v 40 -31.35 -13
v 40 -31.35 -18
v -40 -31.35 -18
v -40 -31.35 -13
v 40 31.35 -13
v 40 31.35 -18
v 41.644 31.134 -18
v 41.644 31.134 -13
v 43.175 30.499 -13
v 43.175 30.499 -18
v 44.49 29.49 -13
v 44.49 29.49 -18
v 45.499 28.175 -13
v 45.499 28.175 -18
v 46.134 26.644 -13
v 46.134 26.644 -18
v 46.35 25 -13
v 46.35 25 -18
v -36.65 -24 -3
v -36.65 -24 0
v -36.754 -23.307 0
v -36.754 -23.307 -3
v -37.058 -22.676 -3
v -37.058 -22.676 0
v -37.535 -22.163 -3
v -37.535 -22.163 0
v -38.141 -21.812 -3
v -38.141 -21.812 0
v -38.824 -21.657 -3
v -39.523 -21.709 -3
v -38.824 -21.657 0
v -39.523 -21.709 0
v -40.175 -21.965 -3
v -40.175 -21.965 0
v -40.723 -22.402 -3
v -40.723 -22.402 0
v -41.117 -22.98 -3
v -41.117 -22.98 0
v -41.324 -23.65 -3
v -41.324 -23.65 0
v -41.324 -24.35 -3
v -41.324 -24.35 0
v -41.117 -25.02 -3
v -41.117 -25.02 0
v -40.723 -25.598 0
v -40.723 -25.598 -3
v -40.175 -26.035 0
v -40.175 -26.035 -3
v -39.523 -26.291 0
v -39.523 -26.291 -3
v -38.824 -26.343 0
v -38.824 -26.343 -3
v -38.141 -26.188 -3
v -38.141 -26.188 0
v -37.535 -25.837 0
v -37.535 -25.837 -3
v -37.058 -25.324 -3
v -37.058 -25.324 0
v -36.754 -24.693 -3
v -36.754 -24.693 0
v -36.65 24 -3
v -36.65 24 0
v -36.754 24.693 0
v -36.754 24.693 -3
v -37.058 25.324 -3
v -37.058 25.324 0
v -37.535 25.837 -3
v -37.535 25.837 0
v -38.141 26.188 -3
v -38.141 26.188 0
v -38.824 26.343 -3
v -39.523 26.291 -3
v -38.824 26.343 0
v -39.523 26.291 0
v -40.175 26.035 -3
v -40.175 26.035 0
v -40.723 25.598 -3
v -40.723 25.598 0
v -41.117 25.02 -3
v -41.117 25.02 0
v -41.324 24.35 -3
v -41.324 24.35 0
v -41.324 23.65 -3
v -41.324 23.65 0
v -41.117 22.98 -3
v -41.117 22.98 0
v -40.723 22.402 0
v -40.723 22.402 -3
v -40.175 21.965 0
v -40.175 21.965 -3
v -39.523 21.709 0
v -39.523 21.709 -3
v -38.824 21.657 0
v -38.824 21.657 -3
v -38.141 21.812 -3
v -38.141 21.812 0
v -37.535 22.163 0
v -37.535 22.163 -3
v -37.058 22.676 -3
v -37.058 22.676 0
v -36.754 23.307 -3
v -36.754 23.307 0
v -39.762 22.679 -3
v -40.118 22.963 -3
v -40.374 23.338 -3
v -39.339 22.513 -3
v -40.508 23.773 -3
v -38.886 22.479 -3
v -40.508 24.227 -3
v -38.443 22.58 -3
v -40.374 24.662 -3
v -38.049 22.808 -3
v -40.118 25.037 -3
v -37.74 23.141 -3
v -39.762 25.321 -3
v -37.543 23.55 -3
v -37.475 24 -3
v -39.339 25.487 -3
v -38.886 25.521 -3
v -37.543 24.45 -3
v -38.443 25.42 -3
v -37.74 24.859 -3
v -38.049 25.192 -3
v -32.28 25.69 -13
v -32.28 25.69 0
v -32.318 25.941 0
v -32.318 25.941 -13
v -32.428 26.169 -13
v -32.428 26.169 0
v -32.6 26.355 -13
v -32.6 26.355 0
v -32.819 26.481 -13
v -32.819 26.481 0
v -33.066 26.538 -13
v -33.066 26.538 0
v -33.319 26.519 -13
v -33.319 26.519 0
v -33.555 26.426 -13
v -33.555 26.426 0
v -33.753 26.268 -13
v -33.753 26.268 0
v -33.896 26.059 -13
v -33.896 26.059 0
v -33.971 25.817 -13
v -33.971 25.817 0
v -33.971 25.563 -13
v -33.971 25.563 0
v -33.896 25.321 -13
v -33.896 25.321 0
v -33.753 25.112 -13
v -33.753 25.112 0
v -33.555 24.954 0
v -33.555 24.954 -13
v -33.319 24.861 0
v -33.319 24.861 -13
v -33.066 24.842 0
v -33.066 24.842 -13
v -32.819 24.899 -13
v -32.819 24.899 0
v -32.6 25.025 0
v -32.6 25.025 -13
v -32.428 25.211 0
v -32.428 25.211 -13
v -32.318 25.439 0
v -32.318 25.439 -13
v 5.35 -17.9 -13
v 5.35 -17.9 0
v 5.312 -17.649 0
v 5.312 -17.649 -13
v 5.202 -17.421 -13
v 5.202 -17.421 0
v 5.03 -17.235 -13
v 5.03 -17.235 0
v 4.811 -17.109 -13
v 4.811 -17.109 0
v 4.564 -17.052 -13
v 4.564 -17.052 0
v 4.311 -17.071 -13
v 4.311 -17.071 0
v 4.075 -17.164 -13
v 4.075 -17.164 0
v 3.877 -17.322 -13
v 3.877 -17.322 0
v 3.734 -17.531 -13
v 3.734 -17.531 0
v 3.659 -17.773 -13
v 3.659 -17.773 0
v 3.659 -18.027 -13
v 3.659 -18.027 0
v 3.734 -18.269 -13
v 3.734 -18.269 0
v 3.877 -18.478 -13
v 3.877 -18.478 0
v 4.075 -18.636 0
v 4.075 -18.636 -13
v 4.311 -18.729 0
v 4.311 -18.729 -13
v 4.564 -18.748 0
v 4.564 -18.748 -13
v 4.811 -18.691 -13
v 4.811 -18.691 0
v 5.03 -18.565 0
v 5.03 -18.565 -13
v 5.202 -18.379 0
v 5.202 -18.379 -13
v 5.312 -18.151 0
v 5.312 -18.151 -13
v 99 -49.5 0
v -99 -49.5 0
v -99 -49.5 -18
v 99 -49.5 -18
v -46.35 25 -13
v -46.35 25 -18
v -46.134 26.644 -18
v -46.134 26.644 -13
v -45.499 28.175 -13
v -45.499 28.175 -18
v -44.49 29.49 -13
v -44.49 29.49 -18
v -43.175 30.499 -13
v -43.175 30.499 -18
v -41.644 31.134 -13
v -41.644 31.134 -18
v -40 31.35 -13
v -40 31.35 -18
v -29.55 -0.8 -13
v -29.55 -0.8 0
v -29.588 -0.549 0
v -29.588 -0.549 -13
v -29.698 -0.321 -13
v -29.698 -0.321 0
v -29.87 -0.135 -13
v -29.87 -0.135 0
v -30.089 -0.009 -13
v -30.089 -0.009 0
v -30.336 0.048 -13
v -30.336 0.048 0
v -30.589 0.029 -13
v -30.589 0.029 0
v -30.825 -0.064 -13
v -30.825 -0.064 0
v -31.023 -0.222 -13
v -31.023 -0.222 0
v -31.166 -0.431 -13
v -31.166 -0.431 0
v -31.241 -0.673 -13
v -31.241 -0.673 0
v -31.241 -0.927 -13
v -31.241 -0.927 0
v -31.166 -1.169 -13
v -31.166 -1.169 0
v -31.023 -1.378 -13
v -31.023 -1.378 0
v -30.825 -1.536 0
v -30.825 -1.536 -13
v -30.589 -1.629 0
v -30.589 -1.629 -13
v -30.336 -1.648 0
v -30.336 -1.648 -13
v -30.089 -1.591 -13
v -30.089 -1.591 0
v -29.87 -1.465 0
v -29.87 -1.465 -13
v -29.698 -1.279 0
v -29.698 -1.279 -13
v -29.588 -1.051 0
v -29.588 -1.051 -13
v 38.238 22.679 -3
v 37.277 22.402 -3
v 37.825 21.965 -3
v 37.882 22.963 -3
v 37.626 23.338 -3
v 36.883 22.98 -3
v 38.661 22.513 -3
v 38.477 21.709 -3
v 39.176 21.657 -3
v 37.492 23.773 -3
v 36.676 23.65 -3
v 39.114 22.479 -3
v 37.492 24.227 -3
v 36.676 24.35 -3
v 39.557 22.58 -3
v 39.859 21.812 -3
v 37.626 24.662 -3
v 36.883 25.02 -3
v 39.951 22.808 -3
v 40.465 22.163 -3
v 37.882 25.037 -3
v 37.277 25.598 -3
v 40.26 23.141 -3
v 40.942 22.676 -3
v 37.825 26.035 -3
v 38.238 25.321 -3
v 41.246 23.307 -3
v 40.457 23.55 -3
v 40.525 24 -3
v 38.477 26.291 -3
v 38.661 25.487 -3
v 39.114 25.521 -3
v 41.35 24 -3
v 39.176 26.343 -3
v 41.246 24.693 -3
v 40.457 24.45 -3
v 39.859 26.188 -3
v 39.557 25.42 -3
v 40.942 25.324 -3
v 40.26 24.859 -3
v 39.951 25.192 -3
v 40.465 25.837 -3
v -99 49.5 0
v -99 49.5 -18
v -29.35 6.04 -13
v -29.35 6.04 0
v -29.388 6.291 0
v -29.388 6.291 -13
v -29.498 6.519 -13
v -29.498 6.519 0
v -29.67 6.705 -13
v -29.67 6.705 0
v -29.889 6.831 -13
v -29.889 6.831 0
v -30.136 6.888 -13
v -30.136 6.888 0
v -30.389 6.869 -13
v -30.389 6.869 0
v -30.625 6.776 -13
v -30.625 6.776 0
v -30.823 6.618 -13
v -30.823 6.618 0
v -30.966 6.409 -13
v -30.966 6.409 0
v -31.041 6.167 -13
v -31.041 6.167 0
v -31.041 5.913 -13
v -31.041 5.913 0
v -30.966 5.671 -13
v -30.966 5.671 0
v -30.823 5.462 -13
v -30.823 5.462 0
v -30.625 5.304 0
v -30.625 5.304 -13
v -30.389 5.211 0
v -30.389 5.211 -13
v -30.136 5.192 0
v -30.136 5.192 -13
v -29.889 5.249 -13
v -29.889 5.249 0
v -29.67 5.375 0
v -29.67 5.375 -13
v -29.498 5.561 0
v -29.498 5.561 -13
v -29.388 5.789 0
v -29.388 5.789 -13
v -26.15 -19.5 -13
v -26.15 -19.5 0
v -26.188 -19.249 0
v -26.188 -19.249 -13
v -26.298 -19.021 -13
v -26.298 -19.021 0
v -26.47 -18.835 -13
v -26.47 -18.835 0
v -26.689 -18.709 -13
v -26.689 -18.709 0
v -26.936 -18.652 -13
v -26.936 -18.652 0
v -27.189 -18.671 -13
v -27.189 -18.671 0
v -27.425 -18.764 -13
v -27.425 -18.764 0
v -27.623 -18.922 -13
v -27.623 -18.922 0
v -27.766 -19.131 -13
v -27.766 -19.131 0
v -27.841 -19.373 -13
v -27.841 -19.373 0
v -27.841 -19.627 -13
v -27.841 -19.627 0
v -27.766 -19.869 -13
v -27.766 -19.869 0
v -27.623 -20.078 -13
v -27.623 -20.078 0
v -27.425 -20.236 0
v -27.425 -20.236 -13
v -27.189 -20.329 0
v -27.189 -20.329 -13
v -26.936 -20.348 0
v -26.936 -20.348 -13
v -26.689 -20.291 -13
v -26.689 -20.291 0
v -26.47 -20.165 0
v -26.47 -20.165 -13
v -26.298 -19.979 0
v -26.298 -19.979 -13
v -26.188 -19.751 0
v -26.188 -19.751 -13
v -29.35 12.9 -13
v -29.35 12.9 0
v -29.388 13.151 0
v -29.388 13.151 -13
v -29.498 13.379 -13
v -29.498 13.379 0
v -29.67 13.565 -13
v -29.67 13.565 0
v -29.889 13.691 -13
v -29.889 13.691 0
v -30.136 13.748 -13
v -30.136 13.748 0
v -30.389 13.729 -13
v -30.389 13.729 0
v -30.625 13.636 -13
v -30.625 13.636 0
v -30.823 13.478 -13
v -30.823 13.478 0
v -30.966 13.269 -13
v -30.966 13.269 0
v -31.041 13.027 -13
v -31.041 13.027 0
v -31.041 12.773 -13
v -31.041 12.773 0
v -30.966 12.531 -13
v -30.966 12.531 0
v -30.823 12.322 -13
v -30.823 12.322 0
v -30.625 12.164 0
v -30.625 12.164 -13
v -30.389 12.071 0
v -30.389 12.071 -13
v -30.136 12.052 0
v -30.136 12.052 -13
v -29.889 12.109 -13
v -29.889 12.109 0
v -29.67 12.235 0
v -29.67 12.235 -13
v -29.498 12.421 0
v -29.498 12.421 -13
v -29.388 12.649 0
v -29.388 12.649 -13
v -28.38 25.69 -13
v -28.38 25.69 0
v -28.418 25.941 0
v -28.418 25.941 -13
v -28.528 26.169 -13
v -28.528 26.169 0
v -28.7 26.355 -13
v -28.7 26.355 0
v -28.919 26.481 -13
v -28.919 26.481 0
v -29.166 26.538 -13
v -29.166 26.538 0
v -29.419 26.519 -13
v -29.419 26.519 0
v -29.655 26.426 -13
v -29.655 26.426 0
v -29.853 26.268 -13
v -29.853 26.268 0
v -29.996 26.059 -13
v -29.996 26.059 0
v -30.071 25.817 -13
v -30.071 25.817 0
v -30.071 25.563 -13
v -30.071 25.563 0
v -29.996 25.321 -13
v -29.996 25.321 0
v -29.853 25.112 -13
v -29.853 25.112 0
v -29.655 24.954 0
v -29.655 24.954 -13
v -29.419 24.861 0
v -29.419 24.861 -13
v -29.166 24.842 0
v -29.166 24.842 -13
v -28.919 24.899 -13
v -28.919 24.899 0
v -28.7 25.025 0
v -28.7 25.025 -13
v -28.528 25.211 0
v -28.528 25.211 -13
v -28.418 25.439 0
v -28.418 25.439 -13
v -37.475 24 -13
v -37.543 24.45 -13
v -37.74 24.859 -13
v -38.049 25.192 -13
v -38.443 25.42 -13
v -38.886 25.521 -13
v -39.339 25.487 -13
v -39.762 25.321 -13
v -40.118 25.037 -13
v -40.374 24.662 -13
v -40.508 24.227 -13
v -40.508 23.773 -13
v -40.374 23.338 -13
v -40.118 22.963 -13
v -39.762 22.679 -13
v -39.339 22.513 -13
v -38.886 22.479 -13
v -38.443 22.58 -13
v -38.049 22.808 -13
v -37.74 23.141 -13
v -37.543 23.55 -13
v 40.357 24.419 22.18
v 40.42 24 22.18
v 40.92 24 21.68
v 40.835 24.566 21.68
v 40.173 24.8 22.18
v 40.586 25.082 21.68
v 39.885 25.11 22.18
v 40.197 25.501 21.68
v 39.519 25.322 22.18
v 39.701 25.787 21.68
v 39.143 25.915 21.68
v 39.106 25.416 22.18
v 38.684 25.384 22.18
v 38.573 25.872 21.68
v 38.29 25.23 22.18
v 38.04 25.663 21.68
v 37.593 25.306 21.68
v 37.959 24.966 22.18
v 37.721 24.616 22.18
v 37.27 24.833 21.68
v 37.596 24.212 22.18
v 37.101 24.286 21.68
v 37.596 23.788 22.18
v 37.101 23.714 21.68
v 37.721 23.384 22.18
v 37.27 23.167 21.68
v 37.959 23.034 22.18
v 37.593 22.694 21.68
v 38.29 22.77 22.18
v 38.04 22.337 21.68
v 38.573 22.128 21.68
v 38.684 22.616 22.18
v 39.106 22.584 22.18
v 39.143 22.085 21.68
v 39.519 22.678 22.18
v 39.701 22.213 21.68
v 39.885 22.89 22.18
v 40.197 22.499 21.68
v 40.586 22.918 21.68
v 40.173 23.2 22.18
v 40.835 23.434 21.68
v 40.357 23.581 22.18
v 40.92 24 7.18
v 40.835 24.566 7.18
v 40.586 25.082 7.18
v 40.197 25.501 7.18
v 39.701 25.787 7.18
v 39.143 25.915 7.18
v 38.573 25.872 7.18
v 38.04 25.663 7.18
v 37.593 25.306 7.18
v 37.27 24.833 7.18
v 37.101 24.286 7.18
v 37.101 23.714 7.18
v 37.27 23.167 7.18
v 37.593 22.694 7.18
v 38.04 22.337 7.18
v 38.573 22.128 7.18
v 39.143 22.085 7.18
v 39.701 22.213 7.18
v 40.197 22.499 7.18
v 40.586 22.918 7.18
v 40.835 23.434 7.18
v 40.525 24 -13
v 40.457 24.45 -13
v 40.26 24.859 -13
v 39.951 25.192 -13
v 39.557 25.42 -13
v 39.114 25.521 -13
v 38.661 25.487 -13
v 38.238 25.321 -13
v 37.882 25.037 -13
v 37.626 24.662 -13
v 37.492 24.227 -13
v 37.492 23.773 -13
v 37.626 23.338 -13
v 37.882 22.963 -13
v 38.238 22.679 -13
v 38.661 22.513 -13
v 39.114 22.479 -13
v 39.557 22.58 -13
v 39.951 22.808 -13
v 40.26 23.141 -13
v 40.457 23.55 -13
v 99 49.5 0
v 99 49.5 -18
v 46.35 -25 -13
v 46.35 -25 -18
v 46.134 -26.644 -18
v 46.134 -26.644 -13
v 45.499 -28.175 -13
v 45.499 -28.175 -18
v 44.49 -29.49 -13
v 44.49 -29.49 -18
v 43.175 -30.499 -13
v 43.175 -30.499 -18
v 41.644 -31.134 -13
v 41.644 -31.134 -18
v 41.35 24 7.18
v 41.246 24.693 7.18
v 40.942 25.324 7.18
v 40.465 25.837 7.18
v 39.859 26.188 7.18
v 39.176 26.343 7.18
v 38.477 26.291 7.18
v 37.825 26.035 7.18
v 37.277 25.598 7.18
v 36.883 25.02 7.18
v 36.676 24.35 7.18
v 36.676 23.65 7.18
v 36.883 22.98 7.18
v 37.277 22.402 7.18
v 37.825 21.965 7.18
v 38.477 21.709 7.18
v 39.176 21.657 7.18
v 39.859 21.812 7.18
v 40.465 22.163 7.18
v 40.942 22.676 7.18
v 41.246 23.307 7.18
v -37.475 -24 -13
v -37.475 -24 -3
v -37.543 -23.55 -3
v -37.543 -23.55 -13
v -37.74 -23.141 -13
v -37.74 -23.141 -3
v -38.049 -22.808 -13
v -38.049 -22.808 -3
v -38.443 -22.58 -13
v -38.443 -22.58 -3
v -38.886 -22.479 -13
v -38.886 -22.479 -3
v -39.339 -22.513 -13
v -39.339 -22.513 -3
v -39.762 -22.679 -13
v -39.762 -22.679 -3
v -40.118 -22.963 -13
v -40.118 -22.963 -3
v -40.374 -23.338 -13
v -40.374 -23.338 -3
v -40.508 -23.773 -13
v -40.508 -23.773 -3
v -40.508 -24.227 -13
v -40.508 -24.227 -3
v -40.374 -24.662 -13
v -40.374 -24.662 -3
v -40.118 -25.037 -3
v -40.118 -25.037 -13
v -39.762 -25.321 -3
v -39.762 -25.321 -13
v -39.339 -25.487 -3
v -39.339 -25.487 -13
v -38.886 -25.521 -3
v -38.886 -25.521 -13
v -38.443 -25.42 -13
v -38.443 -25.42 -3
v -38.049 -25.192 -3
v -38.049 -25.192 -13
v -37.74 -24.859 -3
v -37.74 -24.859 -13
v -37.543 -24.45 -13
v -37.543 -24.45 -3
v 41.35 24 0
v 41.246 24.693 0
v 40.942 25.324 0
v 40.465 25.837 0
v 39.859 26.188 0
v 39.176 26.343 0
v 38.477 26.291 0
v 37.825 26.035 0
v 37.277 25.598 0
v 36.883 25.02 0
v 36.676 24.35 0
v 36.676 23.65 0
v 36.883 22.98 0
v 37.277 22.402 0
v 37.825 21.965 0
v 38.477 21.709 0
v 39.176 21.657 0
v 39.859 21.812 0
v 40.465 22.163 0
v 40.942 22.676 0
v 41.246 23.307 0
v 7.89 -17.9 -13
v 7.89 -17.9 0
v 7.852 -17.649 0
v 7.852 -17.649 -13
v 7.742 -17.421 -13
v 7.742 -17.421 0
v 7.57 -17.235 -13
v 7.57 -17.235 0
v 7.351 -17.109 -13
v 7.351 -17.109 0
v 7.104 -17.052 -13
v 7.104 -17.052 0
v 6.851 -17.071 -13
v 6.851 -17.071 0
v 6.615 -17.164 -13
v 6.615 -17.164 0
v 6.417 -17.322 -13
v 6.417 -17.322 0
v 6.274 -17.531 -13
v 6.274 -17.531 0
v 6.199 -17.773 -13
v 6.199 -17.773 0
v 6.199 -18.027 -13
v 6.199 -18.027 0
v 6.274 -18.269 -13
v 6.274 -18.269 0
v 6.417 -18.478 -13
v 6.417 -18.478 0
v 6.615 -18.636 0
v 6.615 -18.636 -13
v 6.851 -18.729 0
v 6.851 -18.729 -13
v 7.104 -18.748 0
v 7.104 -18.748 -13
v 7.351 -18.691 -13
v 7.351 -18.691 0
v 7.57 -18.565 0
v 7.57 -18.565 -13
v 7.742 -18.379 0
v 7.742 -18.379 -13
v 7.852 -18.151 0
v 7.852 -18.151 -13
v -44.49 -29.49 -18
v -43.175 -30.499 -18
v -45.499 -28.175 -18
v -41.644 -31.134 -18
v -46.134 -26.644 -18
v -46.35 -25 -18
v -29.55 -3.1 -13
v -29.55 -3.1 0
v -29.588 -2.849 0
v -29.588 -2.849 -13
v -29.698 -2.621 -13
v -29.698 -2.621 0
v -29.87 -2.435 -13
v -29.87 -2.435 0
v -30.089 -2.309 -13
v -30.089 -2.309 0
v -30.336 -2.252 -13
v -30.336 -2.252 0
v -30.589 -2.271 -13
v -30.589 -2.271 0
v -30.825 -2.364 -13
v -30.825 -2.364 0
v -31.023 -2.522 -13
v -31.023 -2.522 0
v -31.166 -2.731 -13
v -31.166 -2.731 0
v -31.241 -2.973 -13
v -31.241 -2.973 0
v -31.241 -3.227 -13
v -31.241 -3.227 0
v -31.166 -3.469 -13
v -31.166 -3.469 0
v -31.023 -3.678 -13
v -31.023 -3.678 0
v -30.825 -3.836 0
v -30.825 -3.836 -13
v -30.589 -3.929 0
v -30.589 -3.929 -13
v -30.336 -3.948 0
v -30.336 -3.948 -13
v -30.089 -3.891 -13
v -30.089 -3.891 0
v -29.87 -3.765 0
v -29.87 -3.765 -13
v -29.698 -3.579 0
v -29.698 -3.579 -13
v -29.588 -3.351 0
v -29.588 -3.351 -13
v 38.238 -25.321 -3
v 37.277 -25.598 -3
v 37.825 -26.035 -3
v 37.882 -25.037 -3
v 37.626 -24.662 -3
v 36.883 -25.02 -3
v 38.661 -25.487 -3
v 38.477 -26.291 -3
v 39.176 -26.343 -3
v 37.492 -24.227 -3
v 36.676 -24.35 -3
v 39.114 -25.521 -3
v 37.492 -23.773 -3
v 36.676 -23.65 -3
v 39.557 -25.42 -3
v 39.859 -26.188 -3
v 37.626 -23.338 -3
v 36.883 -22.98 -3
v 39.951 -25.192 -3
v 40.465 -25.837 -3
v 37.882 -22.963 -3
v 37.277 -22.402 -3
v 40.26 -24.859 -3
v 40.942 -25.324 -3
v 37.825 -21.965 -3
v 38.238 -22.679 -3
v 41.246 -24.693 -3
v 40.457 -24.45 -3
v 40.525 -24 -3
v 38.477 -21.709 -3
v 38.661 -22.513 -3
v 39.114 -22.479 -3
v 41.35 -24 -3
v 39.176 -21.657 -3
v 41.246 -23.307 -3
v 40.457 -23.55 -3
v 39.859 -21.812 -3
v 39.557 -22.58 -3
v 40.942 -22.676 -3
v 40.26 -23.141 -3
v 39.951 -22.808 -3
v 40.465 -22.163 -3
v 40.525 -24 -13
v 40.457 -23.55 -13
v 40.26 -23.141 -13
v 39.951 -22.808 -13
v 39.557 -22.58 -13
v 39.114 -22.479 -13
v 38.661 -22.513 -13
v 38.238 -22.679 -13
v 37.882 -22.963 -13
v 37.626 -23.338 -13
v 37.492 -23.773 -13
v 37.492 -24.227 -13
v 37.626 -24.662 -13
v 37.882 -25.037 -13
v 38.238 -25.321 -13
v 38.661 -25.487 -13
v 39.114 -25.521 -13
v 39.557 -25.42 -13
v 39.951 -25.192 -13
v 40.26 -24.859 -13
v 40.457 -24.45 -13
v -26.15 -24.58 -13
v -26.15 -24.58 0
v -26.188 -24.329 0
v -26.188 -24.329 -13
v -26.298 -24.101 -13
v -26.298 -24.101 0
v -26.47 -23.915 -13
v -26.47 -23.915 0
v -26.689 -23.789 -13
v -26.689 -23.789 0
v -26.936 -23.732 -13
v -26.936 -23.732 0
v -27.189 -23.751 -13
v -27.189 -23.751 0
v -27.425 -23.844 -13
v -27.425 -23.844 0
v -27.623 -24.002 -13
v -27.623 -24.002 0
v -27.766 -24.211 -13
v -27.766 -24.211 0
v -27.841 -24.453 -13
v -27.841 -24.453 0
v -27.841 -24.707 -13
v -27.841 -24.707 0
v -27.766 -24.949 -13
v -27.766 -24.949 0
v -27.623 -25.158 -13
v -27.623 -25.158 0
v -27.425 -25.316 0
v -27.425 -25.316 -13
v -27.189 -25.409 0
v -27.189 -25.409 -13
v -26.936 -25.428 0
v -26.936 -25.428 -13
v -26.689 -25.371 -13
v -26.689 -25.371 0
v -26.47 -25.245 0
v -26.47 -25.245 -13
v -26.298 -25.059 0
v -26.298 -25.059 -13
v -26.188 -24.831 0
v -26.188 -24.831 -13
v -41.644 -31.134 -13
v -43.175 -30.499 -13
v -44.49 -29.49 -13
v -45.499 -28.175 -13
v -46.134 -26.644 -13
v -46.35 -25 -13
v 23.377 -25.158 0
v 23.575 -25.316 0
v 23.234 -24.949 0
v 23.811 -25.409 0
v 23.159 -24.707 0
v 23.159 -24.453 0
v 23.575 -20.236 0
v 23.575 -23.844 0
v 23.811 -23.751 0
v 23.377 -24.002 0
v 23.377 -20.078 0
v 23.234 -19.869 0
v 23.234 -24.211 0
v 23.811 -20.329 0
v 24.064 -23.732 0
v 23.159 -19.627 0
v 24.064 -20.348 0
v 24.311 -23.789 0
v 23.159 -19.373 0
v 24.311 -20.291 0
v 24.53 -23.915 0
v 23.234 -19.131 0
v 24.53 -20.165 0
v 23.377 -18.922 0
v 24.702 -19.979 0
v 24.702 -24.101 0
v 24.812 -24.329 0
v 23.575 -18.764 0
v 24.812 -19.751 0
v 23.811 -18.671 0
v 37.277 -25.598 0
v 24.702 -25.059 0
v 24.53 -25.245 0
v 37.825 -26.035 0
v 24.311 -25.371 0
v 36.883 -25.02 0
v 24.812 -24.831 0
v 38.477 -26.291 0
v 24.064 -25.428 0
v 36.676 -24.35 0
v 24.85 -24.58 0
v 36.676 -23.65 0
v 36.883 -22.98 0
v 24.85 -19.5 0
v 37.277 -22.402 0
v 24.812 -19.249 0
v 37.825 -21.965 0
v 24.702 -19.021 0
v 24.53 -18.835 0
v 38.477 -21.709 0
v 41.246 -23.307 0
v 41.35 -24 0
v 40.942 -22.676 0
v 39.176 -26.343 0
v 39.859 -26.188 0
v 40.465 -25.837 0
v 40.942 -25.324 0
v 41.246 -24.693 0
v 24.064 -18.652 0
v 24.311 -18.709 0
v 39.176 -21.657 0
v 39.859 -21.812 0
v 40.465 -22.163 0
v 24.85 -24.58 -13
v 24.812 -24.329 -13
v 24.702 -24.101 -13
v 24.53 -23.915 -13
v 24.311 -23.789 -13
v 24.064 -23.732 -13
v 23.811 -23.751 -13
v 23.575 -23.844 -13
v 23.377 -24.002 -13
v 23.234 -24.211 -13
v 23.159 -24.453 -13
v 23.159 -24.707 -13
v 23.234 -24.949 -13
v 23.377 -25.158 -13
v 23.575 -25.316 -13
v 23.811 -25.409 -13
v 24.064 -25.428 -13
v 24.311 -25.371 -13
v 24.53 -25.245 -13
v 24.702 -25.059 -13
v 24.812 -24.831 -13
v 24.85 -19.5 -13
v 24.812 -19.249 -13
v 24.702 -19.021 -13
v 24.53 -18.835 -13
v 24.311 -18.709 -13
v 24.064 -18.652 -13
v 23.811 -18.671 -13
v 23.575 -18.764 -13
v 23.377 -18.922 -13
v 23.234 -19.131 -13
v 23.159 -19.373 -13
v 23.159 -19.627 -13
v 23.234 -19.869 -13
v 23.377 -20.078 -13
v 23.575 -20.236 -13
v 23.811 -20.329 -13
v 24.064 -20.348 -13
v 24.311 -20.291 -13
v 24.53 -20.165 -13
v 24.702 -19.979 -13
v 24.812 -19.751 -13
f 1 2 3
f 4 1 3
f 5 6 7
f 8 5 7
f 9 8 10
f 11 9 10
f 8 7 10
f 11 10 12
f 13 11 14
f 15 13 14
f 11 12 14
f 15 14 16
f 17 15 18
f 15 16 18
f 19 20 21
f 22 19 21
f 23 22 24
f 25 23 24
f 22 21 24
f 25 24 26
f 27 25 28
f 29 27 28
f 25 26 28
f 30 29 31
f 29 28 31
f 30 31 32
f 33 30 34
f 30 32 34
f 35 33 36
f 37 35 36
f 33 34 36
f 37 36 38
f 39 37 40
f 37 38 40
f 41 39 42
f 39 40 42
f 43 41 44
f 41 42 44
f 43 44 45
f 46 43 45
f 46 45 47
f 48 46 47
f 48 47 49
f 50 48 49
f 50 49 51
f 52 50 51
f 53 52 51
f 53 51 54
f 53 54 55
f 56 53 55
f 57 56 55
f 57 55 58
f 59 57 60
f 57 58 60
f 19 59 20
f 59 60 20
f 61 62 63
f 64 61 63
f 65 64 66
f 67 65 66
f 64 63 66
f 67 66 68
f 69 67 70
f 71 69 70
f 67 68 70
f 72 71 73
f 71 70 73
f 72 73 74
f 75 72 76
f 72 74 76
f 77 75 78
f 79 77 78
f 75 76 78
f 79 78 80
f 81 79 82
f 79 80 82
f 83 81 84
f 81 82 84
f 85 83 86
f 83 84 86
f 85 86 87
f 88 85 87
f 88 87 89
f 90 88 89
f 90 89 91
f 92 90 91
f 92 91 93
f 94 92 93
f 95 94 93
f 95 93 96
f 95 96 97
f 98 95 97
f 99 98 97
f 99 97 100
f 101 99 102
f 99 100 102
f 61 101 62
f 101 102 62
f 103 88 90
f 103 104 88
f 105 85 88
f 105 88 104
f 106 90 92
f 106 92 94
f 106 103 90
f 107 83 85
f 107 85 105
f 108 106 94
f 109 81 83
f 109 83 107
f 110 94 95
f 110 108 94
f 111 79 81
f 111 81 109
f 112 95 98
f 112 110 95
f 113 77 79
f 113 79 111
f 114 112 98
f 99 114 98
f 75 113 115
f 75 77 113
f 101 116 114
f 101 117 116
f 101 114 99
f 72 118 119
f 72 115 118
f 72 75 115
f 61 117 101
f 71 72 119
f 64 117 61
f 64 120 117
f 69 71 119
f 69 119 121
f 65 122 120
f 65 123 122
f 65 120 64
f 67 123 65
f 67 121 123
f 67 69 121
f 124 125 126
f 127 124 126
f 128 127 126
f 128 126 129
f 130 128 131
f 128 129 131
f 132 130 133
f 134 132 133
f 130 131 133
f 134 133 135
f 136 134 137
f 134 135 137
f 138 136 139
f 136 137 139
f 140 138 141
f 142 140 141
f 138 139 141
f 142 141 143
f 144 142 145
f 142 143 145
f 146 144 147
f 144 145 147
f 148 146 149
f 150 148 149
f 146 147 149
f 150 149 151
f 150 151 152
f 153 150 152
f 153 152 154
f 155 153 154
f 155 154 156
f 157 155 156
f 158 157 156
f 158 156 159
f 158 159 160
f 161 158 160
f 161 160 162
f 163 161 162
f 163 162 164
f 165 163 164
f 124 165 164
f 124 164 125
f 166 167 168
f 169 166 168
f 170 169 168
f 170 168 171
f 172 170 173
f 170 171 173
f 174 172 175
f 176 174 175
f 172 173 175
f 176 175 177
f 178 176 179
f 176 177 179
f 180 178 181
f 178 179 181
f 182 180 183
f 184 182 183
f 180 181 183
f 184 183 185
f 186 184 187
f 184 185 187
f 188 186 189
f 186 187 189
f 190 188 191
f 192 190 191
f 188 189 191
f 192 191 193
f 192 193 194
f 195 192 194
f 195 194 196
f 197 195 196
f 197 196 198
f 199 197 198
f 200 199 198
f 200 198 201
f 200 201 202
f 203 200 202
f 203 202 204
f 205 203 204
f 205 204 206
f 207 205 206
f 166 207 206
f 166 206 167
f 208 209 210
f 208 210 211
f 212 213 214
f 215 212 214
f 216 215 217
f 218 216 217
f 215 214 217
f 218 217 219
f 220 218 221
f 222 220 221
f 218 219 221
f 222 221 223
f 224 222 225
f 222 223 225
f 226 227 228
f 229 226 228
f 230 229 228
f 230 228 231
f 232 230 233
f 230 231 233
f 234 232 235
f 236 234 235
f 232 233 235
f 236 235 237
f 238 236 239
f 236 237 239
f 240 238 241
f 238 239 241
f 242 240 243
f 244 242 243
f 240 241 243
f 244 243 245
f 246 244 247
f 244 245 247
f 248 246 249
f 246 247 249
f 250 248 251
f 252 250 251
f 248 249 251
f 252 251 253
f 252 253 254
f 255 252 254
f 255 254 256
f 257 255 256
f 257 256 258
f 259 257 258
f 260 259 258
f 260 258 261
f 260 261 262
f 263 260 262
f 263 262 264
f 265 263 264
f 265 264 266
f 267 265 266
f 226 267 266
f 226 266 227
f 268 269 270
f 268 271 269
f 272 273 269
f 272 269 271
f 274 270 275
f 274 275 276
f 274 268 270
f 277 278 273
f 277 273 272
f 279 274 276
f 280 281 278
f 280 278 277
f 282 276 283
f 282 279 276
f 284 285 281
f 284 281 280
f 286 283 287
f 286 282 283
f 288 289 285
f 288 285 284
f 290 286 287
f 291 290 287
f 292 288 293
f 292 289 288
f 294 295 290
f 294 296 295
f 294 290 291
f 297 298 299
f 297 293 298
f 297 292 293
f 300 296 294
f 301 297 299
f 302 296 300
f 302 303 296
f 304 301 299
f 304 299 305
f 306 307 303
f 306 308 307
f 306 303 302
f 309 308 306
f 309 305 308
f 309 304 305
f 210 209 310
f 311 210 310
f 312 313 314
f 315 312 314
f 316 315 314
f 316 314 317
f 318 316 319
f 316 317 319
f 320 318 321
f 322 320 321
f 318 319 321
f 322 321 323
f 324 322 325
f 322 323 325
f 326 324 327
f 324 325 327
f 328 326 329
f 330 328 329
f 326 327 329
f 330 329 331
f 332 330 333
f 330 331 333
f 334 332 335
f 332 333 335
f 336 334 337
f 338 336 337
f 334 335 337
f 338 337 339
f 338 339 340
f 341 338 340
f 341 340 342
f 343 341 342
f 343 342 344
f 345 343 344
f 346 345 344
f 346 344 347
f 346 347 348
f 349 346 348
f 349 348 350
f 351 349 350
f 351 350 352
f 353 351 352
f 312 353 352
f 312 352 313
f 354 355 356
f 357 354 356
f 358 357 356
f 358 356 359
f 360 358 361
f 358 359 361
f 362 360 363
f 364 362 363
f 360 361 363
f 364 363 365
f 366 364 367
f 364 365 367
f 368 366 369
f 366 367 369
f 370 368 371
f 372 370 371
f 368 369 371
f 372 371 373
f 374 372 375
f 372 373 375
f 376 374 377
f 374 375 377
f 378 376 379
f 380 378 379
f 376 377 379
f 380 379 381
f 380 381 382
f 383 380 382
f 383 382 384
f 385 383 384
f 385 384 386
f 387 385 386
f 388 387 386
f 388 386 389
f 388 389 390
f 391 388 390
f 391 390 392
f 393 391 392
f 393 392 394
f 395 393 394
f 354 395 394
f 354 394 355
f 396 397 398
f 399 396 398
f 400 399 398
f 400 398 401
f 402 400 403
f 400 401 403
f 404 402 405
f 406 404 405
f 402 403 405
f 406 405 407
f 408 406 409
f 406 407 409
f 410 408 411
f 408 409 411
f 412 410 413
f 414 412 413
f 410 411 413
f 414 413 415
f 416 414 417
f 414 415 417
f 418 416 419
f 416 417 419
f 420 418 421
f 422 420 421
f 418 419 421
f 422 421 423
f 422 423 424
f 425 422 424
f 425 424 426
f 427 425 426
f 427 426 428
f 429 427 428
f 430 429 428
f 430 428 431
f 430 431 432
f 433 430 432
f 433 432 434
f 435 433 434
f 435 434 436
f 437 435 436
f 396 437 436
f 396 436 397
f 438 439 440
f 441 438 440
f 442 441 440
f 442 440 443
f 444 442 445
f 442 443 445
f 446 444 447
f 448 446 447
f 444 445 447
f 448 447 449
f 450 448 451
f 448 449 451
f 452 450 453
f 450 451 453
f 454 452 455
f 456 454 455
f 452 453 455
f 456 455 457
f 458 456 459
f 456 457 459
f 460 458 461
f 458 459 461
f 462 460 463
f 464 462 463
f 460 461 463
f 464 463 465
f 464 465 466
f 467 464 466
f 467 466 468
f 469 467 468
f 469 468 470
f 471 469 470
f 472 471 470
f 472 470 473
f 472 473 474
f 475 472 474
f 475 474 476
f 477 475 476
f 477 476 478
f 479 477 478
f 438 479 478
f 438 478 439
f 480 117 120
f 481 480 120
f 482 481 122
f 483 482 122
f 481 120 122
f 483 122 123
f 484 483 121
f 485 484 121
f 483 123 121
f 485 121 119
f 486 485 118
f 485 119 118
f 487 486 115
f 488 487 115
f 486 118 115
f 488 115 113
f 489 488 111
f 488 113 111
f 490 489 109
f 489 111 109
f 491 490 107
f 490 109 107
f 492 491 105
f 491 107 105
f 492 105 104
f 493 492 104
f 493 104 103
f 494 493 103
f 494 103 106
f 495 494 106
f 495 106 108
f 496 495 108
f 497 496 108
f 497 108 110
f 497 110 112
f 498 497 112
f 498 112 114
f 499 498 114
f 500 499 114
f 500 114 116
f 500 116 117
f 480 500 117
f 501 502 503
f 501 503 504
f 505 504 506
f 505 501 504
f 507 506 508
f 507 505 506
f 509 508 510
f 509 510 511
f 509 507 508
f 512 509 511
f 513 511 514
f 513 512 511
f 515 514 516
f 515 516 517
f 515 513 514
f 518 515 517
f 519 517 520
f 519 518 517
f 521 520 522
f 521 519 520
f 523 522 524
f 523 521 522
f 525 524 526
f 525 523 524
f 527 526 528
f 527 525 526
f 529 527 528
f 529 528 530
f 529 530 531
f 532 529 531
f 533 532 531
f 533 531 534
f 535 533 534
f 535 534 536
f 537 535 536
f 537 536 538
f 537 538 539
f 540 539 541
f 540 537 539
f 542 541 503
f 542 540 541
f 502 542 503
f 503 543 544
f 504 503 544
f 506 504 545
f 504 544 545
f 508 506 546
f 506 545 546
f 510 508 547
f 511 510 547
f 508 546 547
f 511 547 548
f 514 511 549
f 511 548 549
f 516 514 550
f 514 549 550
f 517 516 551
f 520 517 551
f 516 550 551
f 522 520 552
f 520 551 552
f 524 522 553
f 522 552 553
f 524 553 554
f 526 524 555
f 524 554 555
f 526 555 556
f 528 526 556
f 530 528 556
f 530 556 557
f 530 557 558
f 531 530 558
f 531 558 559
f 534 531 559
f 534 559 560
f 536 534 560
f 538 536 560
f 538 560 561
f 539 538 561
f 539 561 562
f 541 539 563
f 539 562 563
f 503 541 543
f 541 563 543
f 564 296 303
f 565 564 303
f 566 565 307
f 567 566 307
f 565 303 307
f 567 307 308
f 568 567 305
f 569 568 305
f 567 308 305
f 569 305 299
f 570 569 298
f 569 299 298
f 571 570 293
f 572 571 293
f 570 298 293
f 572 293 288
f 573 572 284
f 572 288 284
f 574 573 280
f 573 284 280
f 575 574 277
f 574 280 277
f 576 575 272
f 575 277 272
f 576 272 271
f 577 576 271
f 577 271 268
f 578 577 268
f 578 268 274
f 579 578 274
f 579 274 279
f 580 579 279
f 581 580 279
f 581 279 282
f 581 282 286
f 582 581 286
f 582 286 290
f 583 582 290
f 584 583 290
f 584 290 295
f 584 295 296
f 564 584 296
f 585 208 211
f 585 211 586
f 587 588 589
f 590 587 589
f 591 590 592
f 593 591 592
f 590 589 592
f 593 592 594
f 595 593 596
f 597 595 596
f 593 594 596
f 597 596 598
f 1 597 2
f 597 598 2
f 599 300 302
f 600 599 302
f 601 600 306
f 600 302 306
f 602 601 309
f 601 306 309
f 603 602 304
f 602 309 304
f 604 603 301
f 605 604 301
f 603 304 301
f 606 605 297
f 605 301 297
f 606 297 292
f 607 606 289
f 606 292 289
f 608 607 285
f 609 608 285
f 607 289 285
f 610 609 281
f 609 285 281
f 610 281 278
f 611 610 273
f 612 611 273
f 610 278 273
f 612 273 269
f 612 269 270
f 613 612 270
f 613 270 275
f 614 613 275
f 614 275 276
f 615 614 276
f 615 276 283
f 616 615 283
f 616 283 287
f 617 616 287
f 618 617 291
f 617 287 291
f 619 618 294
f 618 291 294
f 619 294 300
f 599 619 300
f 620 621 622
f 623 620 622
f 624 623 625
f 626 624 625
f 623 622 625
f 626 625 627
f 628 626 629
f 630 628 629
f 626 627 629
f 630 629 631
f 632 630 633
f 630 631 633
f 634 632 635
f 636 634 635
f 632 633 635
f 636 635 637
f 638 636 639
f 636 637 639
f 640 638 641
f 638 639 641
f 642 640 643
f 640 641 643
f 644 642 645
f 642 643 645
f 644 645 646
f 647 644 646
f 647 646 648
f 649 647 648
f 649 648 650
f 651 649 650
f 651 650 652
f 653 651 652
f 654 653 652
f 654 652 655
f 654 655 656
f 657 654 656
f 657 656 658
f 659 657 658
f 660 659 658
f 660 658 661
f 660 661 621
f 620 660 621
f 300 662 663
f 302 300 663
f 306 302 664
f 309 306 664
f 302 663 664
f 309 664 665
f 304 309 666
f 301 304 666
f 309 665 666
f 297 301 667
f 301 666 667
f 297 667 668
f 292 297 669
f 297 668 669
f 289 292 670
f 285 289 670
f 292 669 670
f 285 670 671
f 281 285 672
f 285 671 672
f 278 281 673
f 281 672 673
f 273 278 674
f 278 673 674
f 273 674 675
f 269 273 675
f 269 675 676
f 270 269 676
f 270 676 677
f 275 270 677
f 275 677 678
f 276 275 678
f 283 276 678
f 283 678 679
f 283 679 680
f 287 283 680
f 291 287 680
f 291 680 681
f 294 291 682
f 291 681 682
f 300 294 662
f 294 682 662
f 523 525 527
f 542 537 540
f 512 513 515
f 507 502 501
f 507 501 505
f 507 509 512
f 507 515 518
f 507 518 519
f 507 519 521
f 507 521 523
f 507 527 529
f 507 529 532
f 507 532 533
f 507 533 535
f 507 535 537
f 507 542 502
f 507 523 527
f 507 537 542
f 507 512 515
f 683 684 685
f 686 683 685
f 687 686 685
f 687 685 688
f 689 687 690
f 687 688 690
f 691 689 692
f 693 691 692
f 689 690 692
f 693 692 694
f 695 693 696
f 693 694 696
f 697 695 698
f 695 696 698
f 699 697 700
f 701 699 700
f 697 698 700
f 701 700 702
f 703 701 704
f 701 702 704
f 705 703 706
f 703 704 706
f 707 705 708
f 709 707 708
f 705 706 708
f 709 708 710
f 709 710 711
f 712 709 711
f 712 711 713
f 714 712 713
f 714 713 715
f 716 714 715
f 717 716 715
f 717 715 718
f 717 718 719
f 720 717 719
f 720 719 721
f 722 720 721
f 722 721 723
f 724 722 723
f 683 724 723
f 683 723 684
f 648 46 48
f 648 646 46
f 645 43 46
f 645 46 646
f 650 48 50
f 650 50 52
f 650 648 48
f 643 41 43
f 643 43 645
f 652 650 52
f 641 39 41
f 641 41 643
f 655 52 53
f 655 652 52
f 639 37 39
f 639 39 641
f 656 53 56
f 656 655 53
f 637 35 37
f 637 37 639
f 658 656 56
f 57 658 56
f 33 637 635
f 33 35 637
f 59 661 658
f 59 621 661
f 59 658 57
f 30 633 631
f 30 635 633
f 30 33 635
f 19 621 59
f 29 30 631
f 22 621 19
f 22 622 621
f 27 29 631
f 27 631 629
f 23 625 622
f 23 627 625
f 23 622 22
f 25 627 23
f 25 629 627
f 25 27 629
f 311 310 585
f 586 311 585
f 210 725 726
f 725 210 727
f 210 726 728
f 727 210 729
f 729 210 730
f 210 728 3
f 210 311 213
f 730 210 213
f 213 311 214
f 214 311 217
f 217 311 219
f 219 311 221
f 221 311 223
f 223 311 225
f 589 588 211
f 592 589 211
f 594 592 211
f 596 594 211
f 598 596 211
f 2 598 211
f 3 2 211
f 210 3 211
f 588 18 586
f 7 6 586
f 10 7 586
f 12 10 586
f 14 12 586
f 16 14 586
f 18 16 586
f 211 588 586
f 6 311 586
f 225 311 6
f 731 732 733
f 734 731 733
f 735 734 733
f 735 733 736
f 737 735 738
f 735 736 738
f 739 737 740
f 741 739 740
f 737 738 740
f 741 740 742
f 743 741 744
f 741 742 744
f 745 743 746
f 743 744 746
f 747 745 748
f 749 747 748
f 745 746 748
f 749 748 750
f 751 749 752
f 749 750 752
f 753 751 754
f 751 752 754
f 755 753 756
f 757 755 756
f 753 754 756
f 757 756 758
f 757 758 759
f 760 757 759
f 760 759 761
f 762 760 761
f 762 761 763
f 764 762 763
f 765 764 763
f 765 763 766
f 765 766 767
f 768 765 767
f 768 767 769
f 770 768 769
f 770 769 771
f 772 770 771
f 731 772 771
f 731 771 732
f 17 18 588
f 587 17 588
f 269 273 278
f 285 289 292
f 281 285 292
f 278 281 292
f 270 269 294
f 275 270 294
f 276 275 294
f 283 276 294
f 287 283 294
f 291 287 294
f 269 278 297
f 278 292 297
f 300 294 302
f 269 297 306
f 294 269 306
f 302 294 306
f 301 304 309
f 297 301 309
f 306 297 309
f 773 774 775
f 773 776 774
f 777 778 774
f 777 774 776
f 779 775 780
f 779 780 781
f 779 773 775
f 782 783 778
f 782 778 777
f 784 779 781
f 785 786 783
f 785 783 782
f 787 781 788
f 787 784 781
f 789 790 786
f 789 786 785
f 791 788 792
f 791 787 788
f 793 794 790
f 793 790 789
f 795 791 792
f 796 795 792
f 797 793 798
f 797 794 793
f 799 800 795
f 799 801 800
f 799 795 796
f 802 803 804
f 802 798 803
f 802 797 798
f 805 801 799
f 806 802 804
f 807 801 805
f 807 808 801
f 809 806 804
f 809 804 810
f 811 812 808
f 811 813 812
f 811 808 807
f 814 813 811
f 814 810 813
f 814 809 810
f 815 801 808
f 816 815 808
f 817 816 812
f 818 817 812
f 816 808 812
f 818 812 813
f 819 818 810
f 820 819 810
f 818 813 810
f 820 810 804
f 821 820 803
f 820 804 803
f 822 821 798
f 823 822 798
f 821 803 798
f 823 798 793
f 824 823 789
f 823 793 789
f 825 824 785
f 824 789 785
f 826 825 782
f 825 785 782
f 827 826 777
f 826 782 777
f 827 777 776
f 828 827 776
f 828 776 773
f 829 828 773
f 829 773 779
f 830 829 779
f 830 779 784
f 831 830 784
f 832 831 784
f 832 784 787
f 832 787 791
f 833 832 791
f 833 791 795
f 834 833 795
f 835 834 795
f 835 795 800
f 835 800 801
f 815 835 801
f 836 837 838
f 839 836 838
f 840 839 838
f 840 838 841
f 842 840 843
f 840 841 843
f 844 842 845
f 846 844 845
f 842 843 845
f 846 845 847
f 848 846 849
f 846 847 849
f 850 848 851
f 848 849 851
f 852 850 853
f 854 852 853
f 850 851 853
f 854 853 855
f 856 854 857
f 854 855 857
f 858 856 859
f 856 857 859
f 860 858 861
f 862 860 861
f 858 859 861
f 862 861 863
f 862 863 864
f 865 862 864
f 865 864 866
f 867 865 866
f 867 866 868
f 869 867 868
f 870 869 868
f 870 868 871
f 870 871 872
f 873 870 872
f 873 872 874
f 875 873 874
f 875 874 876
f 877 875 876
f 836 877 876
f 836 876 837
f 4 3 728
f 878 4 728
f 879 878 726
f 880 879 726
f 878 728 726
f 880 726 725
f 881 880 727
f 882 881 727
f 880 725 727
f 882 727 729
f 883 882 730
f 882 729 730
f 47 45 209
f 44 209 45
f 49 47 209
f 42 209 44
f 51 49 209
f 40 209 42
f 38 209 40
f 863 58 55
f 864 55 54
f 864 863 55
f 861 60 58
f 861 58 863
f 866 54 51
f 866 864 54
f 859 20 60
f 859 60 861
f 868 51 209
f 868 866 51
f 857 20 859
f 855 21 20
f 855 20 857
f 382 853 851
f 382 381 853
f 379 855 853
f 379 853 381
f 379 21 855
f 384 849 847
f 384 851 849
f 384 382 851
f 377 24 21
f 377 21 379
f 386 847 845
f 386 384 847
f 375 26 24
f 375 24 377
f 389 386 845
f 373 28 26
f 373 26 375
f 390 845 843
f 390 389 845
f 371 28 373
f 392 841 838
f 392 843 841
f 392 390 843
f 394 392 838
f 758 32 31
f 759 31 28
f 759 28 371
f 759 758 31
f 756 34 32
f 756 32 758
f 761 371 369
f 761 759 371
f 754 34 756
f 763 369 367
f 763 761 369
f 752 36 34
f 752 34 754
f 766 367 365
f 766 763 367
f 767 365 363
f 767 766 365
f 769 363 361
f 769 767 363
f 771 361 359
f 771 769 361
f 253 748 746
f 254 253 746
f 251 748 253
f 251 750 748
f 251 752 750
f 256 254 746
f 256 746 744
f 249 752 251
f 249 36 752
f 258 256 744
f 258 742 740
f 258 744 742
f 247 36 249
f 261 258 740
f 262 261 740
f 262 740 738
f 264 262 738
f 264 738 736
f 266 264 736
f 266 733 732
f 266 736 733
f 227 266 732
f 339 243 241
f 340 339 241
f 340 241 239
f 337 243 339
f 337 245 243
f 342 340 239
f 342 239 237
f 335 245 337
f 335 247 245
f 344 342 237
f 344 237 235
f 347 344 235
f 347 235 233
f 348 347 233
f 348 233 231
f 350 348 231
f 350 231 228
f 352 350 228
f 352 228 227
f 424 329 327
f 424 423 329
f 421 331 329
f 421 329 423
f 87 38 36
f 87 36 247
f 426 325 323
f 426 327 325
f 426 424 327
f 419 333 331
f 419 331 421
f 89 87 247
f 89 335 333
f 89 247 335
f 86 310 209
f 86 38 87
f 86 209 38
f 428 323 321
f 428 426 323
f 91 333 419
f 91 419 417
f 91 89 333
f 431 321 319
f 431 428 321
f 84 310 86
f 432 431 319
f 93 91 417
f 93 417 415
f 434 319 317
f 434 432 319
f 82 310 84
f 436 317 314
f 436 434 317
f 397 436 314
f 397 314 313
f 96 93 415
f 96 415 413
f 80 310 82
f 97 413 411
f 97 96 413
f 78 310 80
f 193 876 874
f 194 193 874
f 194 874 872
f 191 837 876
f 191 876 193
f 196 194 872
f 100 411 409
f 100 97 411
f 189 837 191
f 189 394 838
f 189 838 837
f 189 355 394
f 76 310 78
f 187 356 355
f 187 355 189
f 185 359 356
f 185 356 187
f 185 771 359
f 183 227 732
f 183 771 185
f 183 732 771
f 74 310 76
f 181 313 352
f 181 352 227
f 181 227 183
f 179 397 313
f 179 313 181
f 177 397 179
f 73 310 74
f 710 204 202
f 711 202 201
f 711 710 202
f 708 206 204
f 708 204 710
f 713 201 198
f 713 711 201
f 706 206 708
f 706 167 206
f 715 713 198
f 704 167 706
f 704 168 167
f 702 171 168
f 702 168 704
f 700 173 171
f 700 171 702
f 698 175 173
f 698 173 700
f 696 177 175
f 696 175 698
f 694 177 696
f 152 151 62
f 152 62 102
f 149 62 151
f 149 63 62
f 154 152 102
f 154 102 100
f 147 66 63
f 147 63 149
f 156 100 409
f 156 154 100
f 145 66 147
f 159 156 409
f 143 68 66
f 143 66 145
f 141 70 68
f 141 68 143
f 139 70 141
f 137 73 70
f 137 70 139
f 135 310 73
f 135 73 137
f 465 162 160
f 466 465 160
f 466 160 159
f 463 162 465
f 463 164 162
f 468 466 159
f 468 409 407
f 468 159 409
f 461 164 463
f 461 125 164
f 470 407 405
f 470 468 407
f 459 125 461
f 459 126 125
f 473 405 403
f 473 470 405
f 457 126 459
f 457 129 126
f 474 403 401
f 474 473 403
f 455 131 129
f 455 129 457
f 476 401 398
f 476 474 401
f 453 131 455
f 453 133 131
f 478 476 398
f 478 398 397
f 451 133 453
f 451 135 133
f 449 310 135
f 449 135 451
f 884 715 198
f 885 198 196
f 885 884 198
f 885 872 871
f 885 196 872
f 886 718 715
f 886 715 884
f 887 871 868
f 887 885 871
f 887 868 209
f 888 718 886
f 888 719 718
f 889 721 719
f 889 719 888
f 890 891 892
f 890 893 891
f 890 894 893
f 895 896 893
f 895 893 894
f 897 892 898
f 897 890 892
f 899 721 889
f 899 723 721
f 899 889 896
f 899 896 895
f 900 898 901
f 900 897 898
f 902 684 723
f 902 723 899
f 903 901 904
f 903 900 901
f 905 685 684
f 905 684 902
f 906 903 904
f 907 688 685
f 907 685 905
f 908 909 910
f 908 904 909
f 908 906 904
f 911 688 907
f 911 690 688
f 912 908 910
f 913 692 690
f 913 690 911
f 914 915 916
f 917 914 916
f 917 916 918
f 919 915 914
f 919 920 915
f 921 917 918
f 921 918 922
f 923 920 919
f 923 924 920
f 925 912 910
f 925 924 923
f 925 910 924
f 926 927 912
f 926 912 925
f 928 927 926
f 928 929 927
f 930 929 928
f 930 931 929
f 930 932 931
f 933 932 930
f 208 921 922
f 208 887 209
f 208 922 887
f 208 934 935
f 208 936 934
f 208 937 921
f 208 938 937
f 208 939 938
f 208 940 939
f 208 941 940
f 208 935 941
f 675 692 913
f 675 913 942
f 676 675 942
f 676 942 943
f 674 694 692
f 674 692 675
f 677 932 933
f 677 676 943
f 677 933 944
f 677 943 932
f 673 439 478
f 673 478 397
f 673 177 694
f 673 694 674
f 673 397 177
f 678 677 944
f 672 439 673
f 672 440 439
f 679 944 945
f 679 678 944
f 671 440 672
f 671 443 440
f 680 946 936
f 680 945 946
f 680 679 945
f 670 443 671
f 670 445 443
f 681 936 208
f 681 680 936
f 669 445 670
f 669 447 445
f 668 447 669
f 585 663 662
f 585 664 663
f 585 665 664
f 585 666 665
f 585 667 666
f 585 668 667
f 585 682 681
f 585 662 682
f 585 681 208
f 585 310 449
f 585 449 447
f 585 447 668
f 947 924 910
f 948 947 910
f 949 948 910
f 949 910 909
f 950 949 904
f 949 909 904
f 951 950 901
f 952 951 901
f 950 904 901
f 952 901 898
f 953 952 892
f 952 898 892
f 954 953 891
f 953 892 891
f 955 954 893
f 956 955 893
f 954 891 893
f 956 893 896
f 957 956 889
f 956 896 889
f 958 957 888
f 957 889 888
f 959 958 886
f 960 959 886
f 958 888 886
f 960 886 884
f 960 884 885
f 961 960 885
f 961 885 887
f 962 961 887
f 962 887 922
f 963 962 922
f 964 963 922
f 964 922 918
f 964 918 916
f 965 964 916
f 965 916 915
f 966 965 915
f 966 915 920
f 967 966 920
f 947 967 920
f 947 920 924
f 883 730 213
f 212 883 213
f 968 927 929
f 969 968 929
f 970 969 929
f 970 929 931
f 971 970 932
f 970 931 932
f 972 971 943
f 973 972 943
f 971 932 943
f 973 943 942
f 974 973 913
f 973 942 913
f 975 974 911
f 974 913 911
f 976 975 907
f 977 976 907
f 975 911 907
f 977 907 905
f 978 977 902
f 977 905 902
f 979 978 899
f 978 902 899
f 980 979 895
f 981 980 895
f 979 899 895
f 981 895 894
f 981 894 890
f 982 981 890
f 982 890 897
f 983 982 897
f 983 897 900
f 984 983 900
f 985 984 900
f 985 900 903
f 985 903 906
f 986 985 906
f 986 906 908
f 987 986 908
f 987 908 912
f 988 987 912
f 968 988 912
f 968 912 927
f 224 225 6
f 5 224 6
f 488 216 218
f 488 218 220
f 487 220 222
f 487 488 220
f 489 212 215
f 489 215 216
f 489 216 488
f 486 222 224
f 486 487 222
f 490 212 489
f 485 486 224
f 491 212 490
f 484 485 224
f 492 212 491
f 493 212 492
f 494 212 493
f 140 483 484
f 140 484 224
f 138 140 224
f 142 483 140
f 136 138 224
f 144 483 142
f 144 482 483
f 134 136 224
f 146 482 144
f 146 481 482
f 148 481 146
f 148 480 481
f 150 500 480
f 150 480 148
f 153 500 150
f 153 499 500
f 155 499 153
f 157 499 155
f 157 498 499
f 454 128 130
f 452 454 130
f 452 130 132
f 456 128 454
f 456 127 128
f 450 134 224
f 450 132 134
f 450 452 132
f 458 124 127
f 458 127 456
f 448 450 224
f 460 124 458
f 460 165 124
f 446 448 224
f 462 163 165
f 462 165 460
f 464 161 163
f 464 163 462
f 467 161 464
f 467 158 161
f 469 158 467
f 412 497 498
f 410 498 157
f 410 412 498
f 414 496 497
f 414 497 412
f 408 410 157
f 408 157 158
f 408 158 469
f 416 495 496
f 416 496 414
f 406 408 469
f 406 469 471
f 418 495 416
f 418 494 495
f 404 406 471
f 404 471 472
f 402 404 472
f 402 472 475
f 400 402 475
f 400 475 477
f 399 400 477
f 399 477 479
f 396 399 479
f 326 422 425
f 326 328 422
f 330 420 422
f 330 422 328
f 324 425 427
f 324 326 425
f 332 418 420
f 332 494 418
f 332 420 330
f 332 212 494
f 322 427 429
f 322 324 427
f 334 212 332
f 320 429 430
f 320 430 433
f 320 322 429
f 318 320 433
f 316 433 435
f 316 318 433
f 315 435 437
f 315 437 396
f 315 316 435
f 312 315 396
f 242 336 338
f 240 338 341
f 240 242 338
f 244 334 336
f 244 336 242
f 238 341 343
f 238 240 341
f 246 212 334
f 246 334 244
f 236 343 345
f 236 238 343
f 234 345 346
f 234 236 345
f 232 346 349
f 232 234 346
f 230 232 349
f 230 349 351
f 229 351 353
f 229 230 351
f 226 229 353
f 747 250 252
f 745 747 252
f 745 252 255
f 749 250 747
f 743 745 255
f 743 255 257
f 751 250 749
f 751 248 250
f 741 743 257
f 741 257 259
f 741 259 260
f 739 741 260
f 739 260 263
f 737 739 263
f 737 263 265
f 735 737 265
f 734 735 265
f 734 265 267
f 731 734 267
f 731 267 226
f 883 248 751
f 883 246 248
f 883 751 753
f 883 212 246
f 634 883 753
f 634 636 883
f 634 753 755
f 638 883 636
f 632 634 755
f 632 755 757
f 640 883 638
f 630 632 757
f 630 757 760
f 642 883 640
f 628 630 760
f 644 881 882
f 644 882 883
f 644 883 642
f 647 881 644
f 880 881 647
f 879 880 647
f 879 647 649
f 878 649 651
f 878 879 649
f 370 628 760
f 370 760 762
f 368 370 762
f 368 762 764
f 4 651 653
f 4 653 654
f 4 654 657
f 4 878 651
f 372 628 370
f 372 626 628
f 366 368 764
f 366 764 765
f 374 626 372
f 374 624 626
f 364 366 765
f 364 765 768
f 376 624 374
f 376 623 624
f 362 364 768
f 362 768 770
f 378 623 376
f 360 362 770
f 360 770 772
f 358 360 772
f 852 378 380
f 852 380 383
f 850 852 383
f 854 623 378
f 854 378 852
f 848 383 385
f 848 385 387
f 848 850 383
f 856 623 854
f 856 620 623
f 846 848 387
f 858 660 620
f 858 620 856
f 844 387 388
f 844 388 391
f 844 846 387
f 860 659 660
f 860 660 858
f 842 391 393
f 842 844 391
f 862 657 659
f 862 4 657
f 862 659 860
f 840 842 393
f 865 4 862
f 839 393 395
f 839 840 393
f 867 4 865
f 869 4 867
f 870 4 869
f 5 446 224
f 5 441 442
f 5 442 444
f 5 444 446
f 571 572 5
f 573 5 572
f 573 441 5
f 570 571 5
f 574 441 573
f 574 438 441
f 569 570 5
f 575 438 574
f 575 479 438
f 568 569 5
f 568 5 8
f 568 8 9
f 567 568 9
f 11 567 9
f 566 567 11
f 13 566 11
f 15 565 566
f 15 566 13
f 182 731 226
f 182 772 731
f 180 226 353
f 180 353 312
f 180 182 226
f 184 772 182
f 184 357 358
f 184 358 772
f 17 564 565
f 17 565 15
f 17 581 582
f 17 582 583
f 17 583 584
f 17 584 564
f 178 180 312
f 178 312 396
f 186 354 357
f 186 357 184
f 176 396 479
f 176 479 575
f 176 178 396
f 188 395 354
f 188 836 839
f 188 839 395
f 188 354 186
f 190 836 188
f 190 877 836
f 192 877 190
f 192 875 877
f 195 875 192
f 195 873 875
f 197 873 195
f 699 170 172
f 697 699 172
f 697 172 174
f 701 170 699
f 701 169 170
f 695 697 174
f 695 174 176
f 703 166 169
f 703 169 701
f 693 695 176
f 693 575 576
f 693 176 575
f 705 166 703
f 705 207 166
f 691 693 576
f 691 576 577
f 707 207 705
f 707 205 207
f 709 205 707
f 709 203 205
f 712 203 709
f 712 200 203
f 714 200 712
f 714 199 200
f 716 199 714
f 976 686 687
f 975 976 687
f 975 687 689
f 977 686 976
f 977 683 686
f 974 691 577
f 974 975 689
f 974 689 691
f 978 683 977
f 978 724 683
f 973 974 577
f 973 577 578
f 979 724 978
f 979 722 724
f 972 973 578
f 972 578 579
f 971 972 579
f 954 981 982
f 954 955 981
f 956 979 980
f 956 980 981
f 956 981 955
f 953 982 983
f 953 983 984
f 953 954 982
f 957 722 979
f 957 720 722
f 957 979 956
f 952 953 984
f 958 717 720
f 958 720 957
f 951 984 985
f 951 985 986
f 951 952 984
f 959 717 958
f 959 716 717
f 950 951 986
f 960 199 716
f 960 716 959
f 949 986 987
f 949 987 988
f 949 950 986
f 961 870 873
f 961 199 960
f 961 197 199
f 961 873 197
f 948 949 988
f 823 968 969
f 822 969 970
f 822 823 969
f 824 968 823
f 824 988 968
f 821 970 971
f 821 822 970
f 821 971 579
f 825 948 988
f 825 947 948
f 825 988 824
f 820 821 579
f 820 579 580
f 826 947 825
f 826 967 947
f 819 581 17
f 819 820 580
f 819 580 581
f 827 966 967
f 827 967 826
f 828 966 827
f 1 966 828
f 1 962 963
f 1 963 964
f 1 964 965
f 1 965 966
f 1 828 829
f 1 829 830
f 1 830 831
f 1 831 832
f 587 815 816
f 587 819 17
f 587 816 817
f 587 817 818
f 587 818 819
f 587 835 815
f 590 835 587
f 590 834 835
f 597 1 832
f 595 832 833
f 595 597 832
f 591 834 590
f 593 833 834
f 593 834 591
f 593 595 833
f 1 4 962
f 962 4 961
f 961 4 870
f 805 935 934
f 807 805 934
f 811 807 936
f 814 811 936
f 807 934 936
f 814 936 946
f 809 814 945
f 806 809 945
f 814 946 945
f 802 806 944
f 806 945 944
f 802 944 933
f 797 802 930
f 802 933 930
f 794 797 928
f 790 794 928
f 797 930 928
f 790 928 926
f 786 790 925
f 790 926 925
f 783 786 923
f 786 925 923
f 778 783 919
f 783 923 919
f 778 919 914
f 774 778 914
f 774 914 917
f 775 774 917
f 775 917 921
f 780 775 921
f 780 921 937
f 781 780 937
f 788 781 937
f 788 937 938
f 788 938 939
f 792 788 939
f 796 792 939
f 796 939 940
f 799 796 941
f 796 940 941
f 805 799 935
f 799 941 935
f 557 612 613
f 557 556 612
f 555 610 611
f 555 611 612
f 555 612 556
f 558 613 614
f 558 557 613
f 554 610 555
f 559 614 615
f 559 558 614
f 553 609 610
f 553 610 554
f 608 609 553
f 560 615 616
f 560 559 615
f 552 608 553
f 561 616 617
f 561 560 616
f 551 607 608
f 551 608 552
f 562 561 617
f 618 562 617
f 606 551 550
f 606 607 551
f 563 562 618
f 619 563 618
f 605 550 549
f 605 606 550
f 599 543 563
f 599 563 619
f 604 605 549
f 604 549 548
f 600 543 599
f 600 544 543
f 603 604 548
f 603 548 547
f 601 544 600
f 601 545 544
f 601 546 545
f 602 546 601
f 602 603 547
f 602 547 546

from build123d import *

# Parameters (mm, degrees)
F0_W      = 198
F0_H      = 99
F1_DEPTH  = 18
F3_DEPTH  = 5
F4_R      = 2.35
F5_DEPTH  = 3
F7_R      = 0.85
F8_DEPTH  = 18.001
F6_R      = 1.525
F9_DEPTH  = 18.001
F11_R     = 2.35
F12_DEPTH = 10.18
F13_R     = 1.92
F14_DEPTH = 15
F15_SIZE  = 0.5


with BuildPart() as f1:
    # F0 (on Top) → F1 (new body)
    with BuildSketch(Plane.XY):
        Rectangle(F0_W, F0_H)
    extrude(amount=-F1_DEPTH)

    # F2 (on face) → F3 (cut)
    with BuildSketch(Plane(origin=(0, 0, -18), x_dir=(1, 0, 0), z_dir=(0, 0, -1))):
        with BuildLine():
            ThreePointArc((46.35, 25), (44.490128, 29.490128), (40, 31.35))
            Line((40, 31.35), (-40, 31.35))
            ThreePointArc((-40, 31.35), (-44.490128, 29.490128), (-46.35, 25))
            Line((-46.35, 25), (-46.35, -25))
            ThreePointArc((-46.35, -25), (-44.490128, -29.490128), (-40, -31.35))
            Line((-40, -31.35), (40, -31.35))
            ThreePointArc((40, -31.35), (44.490128, -29.490128), (46.35, -25))
            Line((46.35, -25), (46.35, 25))
        make_face()
    extrude(amount=-F3_DEPTH, mode=Mode.SUBTRACT)

    # F4 (on face) → F5 (cut)
    with BuildSketch(Plane.XY):
        with Locations((-39, -24)):
            Circle(F4_R)
        with Locations((39, -24)):
            Circle(F4_R)
        with Locations((39, 24)):
            Circle(F4_R)
        with Locations((-39, 24)):
            Circle(F4_R)
    extrude(amount=-F5_DEPTH, mode=Mode.SUBTRACT)

    # F7 (on face) → F8 (cut, through all)
    with BuildSketch(Plane.XY):
        with Locations((4.5, -17.9)):
            Circle(F7_R)
        with Locations((7.04, -17.9)):
            Circle(F7_R)
        with Locations((24, -19.5)):
            Circle(F7_R)
        with Locations((24, -24.58)):
            Circle(F7_R)
        with Locations((-27, -19.5)):
            Circle(F7_R)
        with Locations((-27, -24.58)):
            Circle(F7_R)
        with Locations((-33.13, 25.69)):
            Circle(F7_R)
        with Locations((-30.2, 12.9)):
            Circle(F7_R)
        with Locations((-30.2, 6.04)):
            Circle(F7_R)
        with Locations((-30.4, -0.8)):
            Circle(F7_R)
        with Locations((-30.4, -3.1)):
            Circle(F7_R)
        with Locations((-29.23, 25.69)):
            Circle(F7_R)
    extrude(amount=-F8_DEPTH, mode=Mode.SUBTRACT)

    # F6 (on face) → F9 (cut, through all)
    with BuildSketch(Plane.XY):
        with Locations((-39, 24)):
            Circle(F6_R)
        with Locations((-39, -24)):
            Circle(F6_R)
        with Locations((39, -24)):
            Circle(F6_R)
        with Locations((39, 24)):
            Circle(F6_R)
    extrude(amount=-F9_DEPTH, mode=Mode.SUBTRACT)


with BuildPart() as f12:
    # F11 (on offset) → F12 (new body)
    with BuildSketch(Plane.XY.offset(-3)):
        with Locations((39, 24)):
            Circle(F11_R)
    extrude(amount=F12_DEPTH)

    # F13 (on face) → F14 (join)
    with BuildSketch(Plane.XY.offset(7.18)):
        with Locations((39, 24)):
            Circle(F13_R)
    extrude(amount=F14_DEPTH)

    # F15
    f15_edges = [f12.edges().sort_by_distance(p)[0] for p in [
        (37.08, 24, 22.18),
    ]]
    chamfer(f15_edges, length=F15_SIZE)


solid = Compound([f1.part, f12.part])
